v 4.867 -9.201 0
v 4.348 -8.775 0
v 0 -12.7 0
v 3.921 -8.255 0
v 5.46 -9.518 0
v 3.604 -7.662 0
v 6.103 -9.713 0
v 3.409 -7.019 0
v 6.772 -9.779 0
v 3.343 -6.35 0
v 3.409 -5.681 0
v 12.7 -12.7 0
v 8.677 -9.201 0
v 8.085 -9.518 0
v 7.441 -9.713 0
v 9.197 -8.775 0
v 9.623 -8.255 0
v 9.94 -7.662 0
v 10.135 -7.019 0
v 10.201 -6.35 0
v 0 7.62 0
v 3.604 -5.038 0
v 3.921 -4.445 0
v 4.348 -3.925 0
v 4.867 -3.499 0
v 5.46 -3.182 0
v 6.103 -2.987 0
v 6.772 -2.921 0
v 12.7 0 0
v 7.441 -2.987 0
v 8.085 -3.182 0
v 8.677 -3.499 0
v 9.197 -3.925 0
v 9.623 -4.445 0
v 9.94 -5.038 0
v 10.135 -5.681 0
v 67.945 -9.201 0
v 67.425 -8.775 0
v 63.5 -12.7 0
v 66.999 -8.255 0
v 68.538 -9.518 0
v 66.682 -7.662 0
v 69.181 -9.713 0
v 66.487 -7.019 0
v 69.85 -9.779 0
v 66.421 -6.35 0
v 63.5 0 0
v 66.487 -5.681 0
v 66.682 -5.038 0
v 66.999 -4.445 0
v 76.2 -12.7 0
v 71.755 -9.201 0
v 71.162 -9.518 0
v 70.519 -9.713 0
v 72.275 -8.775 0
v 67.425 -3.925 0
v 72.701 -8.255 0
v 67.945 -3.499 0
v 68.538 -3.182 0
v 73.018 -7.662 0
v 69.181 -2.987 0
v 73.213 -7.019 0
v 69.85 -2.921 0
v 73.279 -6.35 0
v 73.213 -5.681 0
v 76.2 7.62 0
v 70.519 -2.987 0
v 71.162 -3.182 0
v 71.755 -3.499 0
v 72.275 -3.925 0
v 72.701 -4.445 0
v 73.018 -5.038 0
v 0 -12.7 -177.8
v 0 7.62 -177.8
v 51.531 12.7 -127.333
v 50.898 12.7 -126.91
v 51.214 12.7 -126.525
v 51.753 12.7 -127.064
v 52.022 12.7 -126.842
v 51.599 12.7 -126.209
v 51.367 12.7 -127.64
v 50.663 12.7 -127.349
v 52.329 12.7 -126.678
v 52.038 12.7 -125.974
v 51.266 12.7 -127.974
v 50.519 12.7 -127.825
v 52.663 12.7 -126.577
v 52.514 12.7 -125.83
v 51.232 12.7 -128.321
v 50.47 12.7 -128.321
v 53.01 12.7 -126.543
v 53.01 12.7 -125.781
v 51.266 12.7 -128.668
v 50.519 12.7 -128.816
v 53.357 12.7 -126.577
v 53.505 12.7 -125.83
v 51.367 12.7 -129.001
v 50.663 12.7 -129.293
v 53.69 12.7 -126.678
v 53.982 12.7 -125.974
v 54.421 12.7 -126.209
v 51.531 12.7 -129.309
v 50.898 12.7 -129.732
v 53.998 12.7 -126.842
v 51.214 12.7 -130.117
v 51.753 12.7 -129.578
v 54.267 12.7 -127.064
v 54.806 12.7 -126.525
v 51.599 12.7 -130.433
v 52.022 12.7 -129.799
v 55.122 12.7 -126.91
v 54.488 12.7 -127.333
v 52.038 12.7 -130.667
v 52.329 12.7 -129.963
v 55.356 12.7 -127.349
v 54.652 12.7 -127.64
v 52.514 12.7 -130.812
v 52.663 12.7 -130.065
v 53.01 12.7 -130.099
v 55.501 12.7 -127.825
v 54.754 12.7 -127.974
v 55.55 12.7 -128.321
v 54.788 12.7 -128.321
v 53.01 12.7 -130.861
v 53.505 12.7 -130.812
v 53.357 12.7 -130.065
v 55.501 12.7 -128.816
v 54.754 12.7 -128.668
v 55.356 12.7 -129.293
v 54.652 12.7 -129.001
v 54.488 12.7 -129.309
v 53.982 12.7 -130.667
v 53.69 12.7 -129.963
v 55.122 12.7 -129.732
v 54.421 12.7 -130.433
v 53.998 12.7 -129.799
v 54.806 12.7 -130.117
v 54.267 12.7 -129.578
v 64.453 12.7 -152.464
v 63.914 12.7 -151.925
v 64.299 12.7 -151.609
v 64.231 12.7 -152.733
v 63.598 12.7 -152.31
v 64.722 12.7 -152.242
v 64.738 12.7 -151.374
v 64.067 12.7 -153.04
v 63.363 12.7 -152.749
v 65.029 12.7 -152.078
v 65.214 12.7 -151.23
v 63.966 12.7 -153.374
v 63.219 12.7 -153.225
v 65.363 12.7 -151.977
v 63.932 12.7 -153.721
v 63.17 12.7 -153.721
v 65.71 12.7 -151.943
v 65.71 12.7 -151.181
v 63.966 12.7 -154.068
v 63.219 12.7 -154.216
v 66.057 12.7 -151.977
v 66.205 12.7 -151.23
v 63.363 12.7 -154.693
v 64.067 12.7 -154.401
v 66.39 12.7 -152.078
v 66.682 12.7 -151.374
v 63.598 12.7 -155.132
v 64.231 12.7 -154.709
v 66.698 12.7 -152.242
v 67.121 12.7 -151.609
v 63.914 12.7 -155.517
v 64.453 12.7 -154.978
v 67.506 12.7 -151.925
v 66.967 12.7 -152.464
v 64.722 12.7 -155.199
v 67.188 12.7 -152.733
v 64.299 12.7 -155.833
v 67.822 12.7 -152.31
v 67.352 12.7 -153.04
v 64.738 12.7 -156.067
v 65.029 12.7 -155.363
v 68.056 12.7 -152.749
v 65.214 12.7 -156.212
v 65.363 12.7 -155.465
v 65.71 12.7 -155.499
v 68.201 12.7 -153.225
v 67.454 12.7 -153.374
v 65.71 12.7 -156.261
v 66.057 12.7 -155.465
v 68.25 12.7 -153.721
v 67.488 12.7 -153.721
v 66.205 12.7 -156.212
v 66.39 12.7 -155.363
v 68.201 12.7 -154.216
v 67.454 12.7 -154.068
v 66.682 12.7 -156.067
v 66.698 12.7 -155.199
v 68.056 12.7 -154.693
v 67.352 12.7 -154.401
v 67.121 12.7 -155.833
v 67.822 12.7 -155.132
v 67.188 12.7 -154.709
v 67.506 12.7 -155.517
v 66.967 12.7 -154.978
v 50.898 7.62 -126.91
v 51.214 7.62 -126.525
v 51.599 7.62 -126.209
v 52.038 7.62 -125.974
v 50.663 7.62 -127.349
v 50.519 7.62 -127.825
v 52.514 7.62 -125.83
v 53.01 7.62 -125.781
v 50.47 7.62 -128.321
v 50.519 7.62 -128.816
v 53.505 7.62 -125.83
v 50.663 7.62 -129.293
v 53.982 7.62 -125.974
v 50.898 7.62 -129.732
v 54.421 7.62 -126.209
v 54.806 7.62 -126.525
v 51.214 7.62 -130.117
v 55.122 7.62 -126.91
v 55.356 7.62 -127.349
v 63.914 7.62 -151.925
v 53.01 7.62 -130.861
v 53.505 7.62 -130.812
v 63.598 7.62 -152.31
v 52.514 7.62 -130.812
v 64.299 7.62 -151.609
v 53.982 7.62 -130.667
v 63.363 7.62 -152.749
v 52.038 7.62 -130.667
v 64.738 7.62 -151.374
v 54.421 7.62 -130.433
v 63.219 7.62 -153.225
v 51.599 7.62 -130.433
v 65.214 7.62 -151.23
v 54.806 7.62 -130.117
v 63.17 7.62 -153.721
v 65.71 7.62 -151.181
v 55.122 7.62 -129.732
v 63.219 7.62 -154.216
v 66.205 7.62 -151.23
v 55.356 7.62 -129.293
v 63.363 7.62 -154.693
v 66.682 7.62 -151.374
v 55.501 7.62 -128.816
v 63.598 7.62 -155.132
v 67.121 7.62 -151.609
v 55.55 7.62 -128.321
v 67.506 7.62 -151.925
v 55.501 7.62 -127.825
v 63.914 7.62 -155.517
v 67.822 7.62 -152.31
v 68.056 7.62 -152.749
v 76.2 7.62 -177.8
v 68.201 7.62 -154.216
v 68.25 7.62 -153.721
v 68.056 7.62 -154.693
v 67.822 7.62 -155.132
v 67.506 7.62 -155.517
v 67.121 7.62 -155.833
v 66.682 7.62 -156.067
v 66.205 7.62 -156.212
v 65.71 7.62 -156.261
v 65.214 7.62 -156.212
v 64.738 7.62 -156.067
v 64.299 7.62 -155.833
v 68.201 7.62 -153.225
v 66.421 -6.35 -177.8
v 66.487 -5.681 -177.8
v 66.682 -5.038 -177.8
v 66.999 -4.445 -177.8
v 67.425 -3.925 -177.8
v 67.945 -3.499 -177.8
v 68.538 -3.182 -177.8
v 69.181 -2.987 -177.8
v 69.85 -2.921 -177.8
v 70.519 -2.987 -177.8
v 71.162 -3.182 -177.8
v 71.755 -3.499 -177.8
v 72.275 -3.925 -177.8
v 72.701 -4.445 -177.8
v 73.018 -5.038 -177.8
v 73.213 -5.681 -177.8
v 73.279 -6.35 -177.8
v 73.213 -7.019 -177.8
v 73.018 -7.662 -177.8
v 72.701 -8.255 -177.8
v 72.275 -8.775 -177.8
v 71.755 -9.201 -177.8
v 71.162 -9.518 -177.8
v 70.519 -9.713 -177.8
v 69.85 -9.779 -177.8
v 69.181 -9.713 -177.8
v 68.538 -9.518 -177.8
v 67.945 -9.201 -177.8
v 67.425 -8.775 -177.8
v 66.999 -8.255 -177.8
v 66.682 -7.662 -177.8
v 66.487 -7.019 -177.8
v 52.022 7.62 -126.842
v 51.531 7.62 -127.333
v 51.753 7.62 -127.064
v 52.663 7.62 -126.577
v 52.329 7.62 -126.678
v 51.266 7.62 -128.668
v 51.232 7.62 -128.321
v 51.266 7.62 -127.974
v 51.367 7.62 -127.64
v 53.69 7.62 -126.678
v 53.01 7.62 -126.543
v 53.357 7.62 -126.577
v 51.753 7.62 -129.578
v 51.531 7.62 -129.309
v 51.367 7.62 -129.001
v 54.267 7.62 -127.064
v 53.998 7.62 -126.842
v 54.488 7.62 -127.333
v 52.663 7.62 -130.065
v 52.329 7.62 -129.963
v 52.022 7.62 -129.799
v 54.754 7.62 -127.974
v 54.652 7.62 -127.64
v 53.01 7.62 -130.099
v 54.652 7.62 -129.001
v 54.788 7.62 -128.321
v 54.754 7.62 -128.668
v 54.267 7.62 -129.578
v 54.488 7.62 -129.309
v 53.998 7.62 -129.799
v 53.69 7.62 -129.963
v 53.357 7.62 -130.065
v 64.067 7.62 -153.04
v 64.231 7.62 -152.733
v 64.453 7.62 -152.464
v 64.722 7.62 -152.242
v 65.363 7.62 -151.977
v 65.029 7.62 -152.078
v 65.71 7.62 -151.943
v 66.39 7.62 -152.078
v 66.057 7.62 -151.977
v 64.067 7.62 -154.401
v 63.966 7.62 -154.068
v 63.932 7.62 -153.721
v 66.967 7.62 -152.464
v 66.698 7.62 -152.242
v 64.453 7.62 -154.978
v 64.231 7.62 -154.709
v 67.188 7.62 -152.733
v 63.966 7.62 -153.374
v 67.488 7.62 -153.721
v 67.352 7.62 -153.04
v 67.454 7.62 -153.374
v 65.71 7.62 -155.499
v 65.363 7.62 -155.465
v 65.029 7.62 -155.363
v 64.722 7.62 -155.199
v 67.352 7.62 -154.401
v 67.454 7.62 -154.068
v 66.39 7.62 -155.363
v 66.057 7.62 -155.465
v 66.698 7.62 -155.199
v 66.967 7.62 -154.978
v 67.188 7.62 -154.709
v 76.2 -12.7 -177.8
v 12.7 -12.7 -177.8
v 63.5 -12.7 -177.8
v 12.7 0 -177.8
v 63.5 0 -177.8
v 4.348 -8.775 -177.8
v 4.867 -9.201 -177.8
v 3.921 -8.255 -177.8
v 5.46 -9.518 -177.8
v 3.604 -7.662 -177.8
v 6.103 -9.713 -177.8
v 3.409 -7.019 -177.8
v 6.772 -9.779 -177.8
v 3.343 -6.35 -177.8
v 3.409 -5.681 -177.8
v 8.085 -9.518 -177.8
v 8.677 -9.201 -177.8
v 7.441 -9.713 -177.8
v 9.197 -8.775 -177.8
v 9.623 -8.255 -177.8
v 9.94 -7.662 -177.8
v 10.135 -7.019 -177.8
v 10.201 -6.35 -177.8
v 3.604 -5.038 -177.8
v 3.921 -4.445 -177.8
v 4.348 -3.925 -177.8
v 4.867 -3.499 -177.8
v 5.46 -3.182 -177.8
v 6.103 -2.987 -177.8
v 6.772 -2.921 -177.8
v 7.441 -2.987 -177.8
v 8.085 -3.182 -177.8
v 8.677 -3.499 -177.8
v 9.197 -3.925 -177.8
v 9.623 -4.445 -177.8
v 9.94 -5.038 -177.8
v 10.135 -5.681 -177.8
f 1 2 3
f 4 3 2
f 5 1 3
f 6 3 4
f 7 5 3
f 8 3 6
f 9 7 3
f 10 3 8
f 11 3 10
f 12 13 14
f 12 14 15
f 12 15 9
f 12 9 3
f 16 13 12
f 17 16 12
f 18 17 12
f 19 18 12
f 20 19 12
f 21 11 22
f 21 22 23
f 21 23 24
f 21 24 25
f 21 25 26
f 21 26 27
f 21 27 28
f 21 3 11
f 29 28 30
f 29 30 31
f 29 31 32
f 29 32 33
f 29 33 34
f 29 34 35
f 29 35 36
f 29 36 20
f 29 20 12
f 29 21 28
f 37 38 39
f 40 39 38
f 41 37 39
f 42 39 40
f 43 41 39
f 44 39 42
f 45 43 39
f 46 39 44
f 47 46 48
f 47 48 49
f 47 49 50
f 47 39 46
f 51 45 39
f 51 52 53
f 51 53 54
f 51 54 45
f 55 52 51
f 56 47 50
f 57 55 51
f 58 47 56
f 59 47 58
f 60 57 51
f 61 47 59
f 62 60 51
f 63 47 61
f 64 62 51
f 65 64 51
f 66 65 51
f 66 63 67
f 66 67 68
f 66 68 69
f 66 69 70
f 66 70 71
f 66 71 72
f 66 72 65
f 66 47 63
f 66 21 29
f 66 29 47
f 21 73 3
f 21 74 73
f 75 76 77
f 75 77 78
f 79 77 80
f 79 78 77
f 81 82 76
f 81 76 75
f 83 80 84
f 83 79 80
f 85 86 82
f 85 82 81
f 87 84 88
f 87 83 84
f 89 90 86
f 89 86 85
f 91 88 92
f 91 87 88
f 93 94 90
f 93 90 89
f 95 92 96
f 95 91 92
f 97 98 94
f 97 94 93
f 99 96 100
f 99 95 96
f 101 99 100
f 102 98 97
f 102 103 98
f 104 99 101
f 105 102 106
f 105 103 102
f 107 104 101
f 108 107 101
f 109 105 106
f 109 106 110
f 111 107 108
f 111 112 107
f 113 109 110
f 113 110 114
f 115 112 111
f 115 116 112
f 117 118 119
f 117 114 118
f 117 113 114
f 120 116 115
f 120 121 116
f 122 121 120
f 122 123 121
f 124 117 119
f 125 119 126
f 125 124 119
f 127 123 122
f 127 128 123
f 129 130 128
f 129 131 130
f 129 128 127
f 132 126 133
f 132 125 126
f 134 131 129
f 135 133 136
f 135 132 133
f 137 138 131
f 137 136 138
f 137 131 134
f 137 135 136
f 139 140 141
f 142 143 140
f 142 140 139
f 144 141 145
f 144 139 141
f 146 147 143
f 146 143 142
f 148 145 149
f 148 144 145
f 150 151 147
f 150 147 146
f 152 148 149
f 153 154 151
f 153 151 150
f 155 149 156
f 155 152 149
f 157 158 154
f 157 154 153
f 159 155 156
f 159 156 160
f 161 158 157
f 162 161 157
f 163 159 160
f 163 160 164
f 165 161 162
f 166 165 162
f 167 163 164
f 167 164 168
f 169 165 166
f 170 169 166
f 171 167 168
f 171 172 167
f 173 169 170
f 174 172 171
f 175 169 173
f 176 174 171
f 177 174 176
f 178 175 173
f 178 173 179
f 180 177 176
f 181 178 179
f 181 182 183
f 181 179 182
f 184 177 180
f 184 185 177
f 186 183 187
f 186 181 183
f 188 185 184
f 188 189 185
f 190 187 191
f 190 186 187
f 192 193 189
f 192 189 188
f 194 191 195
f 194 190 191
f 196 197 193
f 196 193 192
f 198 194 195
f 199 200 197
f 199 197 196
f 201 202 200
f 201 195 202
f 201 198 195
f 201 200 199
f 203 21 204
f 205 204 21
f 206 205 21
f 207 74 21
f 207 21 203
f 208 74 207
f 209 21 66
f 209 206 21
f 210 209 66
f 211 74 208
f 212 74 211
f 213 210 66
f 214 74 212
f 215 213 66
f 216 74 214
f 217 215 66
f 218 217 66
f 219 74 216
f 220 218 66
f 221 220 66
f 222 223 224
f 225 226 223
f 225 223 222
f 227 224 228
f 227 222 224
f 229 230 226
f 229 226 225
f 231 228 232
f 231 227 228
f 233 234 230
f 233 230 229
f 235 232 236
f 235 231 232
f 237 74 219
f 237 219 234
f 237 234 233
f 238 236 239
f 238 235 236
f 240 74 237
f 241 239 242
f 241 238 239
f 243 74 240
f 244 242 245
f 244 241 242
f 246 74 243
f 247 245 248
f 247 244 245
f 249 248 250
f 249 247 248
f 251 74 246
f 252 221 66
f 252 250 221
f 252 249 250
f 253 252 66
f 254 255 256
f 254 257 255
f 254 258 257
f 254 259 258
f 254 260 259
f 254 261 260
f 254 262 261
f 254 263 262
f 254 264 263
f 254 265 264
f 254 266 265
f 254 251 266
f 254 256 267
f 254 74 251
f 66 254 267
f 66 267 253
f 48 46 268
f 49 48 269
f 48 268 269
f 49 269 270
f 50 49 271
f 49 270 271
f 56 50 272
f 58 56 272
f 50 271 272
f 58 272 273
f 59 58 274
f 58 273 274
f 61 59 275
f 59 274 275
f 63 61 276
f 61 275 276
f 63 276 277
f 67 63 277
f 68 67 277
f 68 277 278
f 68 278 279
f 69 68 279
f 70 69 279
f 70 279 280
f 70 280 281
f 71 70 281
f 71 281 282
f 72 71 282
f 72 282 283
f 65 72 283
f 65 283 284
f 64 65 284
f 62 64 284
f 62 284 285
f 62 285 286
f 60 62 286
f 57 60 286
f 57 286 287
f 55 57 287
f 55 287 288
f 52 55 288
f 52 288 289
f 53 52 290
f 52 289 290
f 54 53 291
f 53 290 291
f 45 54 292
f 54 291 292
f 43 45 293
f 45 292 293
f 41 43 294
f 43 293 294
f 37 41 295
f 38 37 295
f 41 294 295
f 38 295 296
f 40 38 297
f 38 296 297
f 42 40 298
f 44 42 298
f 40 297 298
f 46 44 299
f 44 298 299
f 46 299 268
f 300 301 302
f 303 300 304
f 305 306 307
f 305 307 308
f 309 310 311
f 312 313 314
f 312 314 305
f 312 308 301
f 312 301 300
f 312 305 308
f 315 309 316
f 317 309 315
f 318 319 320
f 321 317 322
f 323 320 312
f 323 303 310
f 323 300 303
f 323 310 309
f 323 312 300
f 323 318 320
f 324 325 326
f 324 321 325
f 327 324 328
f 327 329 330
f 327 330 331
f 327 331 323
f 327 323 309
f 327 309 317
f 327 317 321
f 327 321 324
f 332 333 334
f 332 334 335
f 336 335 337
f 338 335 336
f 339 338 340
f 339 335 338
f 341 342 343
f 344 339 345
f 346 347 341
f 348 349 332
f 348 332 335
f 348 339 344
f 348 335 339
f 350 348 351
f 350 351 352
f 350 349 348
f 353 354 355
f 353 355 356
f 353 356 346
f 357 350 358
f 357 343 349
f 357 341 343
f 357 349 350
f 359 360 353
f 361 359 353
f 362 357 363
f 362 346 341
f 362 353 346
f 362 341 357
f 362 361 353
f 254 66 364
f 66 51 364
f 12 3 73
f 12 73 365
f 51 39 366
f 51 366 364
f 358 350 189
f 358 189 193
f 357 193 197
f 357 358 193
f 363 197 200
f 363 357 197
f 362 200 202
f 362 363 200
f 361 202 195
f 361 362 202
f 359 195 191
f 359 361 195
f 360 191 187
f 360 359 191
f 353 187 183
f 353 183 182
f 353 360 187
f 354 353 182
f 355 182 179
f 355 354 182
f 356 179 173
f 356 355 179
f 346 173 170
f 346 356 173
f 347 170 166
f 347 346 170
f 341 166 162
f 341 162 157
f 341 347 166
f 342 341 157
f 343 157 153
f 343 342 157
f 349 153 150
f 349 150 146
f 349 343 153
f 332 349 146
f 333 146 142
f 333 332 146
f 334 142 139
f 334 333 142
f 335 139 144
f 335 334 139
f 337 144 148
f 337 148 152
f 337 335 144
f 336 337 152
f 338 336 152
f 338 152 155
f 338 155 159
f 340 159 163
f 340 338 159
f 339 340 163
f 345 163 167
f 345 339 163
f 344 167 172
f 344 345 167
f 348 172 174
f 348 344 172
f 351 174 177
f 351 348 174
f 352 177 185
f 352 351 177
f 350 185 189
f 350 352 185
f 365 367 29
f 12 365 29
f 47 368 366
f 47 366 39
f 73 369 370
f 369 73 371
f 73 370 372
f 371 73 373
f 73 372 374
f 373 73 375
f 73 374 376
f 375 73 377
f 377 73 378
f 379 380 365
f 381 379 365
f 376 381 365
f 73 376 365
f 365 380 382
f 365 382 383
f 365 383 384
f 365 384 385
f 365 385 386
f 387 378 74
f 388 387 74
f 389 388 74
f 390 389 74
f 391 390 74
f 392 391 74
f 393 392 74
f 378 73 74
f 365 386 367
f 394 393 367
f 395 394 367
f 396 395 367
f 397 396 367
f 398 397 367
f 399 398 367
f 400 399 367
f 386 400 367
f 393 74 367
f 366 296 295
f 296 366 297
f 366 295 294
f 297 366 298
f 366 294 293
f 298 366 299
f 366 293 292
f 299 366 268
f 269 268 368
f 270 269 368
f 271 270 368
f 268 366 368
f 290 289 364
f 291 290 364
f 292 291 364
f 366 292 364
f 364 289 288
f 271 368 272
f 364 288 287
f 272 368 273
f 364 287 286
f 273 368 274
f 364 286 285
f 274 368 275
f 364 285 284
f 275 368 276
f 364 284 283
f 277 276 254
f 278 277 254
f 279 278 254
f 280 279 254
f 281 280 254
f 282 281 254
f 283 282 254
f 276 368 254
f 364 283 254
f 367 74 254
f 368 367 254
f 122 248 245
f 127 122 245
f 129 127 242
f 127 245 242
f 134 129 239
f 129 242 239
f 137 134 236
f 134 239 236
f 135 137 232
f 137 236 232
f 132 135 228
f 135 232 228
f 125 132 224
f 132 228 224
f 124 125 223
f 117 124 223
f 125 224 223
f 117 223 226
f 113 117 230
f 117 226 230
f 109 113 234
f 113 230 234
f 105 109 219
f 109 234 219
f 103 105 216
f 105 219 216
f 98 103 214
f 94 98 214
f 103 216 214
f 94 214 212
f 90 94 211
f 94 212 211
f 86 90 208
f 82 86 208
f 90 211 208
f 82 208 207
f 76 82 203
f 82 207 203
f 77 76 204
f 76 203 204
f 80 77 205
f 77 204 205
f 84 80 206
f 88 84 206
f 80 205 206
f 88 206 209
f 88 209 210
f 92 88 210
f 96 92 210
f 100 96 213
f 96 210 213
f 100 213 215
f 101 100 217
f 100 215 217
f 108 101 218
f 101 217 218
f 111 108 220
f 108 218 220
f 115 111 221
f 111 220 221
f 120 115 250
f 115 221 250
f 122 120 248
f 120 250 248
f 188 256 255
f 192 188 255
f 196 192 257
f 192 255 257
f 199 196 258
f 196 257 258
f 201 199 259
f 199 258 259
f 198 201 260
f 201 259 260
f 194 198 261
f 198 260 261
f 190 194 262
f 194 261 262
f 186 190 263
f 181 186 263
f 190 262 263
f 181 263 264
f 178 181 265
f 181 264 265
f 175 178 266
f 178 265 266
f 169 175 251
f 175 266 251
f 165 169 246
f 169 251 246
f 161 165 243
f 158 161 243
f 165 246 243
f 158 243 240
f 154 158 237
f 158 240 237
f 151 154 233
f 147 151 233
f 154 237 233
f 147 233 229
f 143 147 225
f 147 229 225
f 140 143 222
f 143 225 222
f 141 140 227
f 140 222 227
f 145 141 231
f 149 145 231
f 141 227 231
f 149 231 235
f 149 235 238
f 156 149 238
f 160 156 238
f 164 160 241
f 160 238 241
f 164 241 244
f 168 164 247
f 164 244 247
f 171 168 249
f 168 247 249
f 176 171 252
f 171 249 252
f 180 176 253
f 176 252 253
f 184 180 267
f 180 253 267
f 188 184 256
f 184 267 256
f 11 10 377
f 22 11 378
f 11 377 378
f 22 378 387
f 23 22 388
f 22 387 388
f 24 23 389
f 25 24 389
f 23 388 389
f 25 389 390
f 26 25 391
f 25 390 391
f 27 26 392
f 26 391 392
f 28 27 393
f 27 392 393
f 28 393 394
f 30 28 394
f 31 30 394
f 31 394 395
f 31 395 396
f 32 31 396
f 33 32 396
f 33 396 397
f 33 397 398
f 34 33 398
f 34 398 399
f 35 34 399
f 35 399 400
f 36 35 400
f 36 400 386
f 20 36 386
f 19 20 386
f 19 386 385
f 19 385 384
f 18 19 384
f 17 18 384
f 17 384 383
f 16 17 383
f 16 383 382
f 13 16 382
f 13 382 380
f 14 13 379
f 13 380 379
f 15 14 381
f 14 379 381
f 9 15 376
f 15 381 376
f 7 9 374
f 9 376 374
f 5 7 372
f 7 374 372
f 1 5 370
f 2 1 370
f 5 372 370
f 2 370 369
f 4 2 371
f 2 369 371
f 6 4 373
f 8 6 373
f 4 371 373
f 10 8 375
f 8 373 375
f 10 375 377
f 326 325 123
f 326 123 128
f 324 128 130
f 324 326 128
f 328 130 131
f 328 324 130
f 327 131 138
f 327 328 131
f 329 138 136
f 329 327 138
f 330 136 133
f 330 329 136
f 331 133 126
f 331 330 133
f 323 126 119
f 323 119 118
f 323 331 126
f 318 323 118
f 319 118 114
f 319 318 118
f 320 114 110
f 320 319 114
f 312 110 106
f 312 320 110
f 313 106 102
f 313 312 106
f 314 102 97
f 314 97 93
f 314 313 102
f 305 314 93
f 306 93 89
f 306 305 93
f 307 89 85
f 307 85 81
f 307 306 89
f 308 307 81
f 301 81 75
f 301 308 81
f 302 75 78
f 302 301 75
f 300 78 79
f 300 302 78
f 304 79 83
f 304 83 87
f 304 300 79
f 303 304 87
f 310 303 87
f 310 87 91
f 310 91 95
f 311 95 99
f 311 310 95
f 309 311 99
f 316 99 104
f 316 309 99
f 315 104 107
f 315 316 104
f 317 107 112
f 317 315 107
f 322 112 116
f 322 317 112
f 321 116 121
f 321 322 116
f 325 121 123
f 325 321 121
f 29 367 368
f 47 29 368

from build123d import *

# Parameters (mm, degrees)
SKETCH1_W           = 76.2
SKETCH1_H           = 177.8
BOSS_EXTRUDE1_DEPTH = 7.62
SKETCH4_W           = 12.7
SKETCH4_H           = 177.8
BOSS_EXTRUDE2_DEPTH = 12.7
SKETCH5_R           = 3.429
CUT_EXTRUDE1_DEPTH  = 178.8
SKETCH6_R           = 2.54
SKETCH6_R_2         = 1.778
BOSS_EXTRUDE3_DEPTH = 5.08


with BuildPart() as part:
    # Sketch1 → Boss-Extrude1 (new body)
    with BuildSketch(Plane(origin=(0, 0, 0), x_dir=(1, 0, 0), z_dir=(0, 1, 0))):
        with Locations((38.1, 88.9)):
            Rectangle(SKETCH1_W, SKETCH1_H)
    extrude(amount=BOSS_EXTRUDE1_DEPTH)

    # Sketch4 → Boss-Extrude2 (add)
    with BuildSketch(Plane.XZ):
        with Locations((6.35, -88.9)):
            Rectangle(SKETCH4_W, SKETCH4_H)
        with Locations((69.85, -88.9)):
            Rectangle(SKETCH4_W, SKETCH4_H)
    extrude(amount=BOSS_EXTRUDE2_DEPTH)

    # Sketch5 → Cut-Extrude1 (cut, through all)
    with BuildSketch(Plane(origin=(0, 0, -177.8), x_dir=(-1, 0, 0), z_dir=(0, 0, -1))):
        with Locations((-69.85, -6.35)):
            Circle(SKETCH5_R)
        with Locations((-6.772351806, -6.35)):
            Circle(SKETCH5_R)
    extrude(amount=-CUT_EXTRUDE1_DEPTH, mode=Mode.SUBTRACT)

    # Sketch6 → Boss-Extrude3 (add)
    with BuildSketch(Plane(origin=(0, 7.62, 0), x_dir=(1, 0, 0), z_dir=(0, 1, 0))):
        with Locations((53.0098, 128.3208)):
            Circle(SKETCH6_R)
        with Locations((53.0098, 128.3208)):
            Circle(SKETCH6_R_2, mode=Mode.SUBTRACT)
        with Locations((65.7098, 153.7208)):
            Circle(SKETCH6_R)
        with Locations((65.7098, 153.7208)):
            Circle(SKETCH6_R_2, mode=Mode.SUBTRACT)
    extrude(amount=BOSS_EXTRUDE3_DEPTH)


solid = part.part
